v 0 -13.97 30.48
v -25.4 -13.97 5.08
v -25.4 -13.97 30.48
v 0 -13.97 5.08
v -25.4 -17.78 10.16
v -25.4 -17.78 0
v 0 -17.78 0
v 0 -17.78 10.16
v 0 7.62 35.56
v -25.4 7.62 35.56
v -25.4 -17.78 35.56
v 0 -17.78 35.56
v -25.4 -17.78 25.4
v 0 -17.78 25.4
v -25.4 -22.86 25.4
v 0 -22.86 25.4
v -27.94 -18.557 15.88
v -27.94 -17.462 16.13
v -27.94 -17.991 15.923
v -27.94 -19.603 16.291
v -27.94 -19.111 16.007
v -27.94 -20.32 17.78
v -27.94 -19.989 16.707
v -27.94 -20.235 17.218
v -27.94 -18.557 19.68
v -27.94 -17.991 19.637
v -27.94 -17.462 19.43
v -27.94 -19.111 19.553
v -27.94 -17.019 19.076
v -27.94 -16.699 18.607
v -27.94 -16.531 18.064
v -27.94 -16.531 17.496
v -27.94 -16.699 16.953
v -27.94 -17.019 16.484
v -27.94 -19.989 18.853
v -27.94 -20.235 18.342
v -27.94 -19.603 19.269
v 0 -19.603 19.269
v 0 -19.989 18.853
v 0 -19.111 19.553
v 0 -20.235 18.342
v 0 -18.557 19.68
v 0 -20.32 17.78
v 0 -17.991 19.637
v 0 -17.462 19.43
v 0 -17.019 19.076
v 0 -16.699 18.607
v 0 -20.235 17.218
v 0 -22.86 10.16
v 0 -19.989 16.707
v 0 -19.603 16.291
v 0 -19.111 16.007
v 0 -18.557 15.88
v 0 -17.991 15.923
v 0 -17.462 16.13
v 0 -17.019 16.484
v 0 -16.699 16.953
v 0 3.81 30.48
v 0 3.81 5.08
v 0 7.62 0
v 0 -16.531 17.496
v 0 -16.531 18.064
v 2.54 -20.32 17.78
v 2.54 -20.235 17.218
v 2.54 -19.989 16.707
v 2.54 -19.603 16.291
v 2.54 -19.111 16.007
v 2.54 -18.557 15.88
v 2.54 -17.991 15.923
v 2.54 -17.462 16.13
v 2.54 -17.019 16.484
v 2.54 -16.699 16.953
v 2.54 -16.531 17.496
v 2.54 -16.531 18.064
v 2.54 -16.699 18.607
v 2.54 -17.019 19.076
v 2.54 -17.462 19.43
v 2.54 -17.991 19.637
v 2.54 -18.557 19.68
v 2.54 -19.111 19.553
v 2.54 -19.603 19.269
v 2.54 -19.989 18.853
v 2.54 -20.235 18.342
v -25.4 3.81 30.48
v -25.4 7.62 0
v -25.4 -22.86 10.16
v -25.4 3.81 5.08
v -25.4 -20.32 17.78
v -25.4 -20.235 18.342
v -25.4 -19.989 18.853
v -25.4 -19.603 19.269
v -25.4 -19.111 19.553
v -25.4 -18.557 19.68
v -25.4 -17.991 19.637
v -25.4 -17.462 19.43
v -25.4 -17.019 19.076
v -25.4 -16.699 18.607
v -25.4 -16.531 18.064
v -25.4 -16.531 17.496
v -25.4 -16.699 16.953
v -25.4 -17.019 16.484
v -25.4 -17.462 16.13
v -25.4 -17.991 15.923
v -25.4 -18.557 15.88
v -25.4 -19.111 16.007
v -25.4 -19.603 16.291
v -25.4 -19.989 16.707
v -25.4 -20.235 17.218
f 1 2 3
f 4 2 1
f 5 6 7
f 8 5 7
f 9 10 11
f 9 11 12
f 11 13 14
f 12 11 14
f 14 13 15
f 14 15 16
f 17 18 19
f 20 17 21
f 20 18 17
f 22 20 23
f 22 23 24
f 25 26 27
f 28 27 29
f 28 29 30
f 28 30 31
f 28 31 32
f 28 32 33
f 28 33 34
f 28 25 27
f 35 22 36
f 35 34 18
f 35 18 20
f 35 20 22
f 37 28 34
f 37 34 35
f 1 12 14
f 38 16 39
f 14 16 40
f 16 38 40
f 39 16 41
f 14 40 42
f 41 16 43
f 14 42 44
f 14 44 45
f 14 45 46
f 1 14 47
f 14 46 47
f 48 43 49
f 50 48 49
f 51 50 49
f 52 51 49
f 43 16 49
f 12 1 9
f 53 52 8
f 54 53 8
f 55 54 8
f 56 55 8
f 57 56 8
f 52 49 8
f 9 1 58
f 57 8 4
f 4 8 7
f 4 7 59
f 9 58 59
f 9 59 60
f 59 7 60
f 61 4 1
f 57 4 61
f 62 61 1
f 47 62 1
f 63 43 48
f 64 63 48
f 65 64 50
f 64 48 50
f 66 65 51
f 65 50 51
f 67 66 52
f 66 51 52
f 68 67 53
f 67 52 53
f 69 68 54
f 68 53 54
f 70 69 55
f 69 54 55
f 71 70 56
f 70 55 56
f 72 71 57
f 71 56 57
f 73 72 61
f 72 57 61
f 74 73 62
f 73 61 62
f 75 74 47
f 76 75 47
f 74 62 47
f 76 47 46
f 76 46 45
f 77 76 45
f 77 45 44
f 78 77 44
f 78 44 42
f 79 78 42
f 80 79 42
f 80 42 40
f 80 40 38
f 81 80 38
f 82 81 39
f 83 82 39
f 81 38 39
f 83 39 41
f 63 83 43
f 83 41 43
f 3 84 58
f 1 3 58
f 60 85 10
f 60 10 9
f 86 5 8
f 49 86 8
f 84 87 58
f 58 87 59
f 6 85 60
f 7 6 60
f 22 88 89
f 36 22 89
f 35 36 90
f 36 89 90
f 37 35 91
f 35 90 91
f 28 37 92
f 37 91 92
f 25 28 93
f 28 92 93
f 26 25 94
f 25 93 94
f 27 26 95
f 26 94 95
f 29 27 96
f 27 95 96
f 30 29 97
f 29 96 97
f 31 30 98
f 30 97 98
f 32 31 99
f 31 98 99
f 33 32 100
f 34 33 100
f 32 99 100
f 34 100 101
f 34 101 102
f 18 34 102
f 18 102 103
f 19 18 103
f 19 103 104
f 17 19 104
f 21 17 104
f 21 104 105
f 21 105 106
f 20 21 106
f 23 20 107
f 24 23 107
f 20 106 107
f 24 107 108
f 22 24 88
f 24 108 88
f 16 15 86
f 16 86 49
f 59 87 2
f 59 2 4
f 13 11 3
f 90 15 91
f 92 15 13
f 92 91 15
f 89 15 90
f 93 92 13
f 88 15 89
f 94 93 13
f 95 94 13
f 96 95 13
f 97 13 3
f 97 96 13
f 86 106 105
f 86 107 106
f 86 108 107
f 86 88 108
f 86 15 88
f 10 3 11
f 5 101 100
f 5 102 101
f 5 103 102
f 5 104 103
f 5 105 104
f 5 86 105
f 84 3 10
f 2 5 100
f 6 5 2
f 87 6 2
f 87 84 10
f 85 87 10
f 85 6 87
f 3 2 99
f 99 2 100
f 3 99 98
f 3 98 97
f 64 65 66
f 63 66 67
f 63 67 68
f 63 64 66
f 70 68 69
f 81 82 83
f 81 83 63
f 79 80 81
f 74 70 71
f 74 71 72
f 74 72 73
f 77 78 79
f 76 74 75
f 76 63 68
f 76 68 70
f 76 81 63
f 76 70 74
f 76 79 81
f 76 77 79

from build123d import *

# Parameters (mm, degrees)
F0_W      = 25.4
F0_H      = 7.62
F0_H_2    = 17.78
F1_DEPTH  = 5.08
F2_W      = 25.4
F2_H      = 3.81
F3_DEPTH  = 25.4
F4_W      = 25.4
F4_H      = 25.4
F5_DEPTH  = 5.08
F6_W      = 25.4
F6_H      = 15.24
F7_DEPTH  = 5.08
F9_DEPTH  = 2.54
F11_DEPTH = 2.54


with BuildPart() as f1:
    # F0 (on Top) → F1 (new body)
    with BuildSketch(Plane.XY):
        with Locations((-12.7, 3.81)):
            Rectangle(F0_W, F0_H)
        with Locations((-12.7, -8.89)):
            Rectangle(F0_W, F0_H_2)
    extrude(amount=F1_DEPTH)

    # F2 (on face) → F3 (join)
    with BuildSketch(Plane.XY.offset(5.08)):
        with Locations((-12.7, -15.875)):
            Rectangle(F2_W, F2_H)
        with Locations((-12.7, 5.715)):
            Rectangle(F2_W, F2_H)
    extrude(amount=F3_DEPTH)

    # F4 (on face) → F5 (join)
    with BuildSketch(Plane.XY.offset(30.48)):
        with Locations((-12.7, -5.08)):
            Rectangle(F4_W, F4_H)
    extrude(amount=F5_DEPTH)

    # F6 (on face) → F7 (join)
    with BuildSketch(Plane.XZ.offset(17.78)):
        with Locations((-12.7, 17.78)):
            Rectangle(F6_W, F6_H)
    extrude(amount=F7_DEPTH)

    # F8 (on face) → F9 (join)
    with BuildSketch(Plane.YZ):
        with BuildLine():
            Line((-20.32, 17.78), (-18.415, 17.78))
            Line((-18.415, 17.78), (-16.51, 17.78))
            ThreePointArc((-16.51, 17.78), (-18.415, 19.685), (-20.32, 17.78))
        make_face()
        with BuildLine():
            Line((-16.51, 17.78), (-18.415, 17.78))
            Line((-18.415, 17.78), (-20.32, 17.78))
            ThreePointArc((-20.32, 17.78), (-18.415, 15.875), (-16.51, 17.78))
        make_face()
    extrude(amount=F9_DEPTH)

    # F10 (on face) → F11 (join)
    with BuildSketch(Plane(origin=(-25.4, 0, 0), x_dir=(0, -1, 0), z_dir=(-1, 0, 0))):
        with BuildLine():
            ThreePointArc((16.51, 17.78), (18.415, 15.875), (20.32, 17.78))
            Line((20.32, 17.78), (18.415, 17.78))
            Line((18.415, 17.78), (16.51, 17.78))
        make_face()
        with BuildLine():
            Line((18.415, 17.78), (20.32, 17.78))
            ThreePointArc((20.32, 17.78), (18.415, 19.685), (16.51, 17.78))
            Line((16.51, 17.78), (18.415, 17.78))
        make_face()
    extrude(amount=F11_DEPTH)


solid = f1.part
